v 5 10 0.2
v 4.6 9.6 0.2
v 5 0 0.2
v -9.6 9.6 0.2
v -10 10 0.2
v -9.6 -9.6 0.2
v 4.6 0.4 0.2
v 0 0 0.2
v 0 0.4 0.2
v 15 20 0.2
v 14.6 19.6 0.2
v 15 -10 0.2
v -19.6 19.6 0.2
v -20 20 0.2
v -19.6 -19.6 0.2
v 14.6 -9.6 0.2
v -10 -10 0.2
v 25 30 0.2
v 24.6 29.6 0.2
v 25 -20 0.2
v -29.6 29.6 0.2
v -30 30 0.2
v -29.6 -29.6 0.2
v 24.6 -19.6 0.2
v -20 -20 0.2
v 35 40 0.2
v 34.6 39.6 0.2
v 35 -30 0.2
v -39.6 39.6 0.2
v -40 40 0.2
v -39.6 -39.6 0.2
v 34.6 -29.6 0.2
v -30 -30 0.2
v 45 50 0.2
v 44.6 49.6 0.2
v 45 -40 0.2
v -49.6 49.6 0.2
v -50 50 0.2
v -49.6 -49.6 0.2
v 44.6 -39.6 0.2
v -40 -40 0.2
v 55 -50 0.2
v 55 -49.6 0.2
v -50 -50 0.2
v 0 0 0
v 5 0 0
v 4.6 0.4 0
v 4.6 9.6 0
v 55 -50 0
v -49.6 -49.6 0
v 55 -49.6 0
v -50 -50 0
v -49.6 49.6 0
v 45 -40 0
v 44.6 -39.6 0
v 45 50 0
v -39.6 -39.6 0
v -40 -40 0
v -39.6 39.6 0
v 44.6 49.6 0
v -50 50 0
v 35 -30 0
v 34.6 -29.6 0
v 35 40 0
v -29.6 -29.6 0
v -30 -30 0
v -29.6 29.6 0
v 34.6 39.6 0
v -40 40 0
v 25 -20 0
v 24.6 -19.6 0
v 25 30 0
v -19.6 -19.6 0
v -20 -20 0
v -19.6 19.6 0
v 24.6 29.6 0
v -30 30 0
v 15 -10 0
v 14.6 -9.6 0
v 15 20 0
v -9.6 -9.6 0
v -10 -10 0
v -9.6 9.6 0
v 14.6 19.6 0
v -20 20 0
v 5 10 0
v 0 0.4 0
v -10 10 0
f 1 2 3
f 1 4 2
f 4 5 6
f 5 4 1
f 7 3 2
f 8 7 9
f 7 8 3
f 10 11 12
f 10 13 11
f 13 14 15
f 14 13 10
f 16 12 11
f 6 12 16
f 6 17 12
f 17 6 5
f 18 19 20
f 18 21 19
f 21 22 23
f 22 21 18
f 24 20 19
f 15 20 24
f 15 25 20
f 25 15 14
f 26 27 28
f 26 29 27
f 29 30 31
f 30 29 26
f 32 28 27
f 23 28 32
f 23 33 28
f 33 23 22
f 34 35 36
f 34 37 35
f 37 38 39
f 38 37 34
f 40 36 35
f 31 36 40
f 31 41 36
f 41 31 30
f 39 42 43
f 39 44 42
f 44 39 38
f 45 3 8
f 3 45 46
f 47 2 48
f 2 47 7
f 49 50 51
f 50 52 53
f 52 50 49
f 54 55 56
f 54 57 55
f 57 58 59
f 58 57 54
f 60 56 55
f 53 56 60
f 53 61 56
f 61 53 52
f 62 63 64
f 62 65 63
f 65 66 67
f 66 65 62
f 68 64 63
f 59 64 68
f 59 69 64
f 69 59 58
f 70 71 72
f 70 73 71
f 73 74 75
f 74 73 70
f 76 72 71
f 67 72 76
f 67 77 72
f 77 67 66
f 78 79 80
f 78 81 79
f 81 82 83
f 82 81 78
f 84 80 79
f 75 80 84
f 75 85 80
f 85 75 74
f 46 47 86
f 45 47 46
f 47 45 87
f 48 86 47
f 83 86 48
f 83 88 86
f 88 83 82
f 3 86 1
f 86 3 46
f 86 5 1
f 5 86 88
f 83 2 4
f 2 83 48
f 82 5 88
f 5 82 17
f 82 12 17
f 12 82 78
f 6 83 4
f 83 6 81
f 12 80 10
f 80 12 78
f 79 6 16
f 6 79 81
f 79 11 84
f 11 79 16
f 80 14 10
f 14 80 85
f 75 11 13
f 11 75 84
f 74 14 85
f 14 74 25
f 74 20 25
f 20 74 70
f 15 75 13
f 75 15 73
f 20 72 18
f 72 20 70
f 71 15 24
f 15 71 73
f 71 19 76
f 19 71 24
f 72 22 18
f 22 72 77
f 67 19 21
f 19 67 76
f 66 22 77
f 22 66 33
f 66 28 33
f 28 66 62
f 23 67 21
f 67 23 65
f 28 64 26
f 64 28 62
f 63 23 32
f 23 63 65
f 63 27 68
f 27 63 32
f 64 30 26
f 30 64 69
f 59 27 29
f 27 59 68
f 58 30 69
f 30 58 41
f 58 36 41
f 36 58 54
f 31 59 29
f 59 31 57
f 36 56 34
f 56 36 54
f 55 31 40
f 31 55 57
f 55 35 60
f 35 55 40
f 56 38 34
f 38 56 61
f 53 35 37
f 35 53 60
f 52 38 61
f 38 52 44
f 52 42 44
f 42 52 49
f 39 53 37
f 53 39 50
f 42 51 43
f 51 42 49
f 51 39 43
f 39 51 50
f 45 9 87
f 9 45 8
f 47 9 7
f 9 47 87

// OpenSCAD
gapWidth = 5; // [3:10]
lineWidth = 0.4; // [0.2,0.4,0.8,1.0,1.2]
lineHeight = 0.2; // [0.1:0.01:1]
//number of lines
steps = 20; // [1:1:50]

//builds a single layer high single extrusion width "square sprial" for checking bed level;

translate([ 0*gapWidth, 0*gapWidth,0]) rotate(  0) cube([gapWidth*1,lineWidth,lineHeight]);
for(i=[1:steps]){
x = (1-2*(1-(ceil(i/2)%2)))*ceil(i/2);
y = (1-2*(ceil((i+1)/2)%2))*(2*ceil((i-1)/4));
translate([ x *gapWidth, y*gapWidth,0]) rotate(90*(i%4)) cube([gapWidth*(i+1),lineWidth,lineHeight]);
}
